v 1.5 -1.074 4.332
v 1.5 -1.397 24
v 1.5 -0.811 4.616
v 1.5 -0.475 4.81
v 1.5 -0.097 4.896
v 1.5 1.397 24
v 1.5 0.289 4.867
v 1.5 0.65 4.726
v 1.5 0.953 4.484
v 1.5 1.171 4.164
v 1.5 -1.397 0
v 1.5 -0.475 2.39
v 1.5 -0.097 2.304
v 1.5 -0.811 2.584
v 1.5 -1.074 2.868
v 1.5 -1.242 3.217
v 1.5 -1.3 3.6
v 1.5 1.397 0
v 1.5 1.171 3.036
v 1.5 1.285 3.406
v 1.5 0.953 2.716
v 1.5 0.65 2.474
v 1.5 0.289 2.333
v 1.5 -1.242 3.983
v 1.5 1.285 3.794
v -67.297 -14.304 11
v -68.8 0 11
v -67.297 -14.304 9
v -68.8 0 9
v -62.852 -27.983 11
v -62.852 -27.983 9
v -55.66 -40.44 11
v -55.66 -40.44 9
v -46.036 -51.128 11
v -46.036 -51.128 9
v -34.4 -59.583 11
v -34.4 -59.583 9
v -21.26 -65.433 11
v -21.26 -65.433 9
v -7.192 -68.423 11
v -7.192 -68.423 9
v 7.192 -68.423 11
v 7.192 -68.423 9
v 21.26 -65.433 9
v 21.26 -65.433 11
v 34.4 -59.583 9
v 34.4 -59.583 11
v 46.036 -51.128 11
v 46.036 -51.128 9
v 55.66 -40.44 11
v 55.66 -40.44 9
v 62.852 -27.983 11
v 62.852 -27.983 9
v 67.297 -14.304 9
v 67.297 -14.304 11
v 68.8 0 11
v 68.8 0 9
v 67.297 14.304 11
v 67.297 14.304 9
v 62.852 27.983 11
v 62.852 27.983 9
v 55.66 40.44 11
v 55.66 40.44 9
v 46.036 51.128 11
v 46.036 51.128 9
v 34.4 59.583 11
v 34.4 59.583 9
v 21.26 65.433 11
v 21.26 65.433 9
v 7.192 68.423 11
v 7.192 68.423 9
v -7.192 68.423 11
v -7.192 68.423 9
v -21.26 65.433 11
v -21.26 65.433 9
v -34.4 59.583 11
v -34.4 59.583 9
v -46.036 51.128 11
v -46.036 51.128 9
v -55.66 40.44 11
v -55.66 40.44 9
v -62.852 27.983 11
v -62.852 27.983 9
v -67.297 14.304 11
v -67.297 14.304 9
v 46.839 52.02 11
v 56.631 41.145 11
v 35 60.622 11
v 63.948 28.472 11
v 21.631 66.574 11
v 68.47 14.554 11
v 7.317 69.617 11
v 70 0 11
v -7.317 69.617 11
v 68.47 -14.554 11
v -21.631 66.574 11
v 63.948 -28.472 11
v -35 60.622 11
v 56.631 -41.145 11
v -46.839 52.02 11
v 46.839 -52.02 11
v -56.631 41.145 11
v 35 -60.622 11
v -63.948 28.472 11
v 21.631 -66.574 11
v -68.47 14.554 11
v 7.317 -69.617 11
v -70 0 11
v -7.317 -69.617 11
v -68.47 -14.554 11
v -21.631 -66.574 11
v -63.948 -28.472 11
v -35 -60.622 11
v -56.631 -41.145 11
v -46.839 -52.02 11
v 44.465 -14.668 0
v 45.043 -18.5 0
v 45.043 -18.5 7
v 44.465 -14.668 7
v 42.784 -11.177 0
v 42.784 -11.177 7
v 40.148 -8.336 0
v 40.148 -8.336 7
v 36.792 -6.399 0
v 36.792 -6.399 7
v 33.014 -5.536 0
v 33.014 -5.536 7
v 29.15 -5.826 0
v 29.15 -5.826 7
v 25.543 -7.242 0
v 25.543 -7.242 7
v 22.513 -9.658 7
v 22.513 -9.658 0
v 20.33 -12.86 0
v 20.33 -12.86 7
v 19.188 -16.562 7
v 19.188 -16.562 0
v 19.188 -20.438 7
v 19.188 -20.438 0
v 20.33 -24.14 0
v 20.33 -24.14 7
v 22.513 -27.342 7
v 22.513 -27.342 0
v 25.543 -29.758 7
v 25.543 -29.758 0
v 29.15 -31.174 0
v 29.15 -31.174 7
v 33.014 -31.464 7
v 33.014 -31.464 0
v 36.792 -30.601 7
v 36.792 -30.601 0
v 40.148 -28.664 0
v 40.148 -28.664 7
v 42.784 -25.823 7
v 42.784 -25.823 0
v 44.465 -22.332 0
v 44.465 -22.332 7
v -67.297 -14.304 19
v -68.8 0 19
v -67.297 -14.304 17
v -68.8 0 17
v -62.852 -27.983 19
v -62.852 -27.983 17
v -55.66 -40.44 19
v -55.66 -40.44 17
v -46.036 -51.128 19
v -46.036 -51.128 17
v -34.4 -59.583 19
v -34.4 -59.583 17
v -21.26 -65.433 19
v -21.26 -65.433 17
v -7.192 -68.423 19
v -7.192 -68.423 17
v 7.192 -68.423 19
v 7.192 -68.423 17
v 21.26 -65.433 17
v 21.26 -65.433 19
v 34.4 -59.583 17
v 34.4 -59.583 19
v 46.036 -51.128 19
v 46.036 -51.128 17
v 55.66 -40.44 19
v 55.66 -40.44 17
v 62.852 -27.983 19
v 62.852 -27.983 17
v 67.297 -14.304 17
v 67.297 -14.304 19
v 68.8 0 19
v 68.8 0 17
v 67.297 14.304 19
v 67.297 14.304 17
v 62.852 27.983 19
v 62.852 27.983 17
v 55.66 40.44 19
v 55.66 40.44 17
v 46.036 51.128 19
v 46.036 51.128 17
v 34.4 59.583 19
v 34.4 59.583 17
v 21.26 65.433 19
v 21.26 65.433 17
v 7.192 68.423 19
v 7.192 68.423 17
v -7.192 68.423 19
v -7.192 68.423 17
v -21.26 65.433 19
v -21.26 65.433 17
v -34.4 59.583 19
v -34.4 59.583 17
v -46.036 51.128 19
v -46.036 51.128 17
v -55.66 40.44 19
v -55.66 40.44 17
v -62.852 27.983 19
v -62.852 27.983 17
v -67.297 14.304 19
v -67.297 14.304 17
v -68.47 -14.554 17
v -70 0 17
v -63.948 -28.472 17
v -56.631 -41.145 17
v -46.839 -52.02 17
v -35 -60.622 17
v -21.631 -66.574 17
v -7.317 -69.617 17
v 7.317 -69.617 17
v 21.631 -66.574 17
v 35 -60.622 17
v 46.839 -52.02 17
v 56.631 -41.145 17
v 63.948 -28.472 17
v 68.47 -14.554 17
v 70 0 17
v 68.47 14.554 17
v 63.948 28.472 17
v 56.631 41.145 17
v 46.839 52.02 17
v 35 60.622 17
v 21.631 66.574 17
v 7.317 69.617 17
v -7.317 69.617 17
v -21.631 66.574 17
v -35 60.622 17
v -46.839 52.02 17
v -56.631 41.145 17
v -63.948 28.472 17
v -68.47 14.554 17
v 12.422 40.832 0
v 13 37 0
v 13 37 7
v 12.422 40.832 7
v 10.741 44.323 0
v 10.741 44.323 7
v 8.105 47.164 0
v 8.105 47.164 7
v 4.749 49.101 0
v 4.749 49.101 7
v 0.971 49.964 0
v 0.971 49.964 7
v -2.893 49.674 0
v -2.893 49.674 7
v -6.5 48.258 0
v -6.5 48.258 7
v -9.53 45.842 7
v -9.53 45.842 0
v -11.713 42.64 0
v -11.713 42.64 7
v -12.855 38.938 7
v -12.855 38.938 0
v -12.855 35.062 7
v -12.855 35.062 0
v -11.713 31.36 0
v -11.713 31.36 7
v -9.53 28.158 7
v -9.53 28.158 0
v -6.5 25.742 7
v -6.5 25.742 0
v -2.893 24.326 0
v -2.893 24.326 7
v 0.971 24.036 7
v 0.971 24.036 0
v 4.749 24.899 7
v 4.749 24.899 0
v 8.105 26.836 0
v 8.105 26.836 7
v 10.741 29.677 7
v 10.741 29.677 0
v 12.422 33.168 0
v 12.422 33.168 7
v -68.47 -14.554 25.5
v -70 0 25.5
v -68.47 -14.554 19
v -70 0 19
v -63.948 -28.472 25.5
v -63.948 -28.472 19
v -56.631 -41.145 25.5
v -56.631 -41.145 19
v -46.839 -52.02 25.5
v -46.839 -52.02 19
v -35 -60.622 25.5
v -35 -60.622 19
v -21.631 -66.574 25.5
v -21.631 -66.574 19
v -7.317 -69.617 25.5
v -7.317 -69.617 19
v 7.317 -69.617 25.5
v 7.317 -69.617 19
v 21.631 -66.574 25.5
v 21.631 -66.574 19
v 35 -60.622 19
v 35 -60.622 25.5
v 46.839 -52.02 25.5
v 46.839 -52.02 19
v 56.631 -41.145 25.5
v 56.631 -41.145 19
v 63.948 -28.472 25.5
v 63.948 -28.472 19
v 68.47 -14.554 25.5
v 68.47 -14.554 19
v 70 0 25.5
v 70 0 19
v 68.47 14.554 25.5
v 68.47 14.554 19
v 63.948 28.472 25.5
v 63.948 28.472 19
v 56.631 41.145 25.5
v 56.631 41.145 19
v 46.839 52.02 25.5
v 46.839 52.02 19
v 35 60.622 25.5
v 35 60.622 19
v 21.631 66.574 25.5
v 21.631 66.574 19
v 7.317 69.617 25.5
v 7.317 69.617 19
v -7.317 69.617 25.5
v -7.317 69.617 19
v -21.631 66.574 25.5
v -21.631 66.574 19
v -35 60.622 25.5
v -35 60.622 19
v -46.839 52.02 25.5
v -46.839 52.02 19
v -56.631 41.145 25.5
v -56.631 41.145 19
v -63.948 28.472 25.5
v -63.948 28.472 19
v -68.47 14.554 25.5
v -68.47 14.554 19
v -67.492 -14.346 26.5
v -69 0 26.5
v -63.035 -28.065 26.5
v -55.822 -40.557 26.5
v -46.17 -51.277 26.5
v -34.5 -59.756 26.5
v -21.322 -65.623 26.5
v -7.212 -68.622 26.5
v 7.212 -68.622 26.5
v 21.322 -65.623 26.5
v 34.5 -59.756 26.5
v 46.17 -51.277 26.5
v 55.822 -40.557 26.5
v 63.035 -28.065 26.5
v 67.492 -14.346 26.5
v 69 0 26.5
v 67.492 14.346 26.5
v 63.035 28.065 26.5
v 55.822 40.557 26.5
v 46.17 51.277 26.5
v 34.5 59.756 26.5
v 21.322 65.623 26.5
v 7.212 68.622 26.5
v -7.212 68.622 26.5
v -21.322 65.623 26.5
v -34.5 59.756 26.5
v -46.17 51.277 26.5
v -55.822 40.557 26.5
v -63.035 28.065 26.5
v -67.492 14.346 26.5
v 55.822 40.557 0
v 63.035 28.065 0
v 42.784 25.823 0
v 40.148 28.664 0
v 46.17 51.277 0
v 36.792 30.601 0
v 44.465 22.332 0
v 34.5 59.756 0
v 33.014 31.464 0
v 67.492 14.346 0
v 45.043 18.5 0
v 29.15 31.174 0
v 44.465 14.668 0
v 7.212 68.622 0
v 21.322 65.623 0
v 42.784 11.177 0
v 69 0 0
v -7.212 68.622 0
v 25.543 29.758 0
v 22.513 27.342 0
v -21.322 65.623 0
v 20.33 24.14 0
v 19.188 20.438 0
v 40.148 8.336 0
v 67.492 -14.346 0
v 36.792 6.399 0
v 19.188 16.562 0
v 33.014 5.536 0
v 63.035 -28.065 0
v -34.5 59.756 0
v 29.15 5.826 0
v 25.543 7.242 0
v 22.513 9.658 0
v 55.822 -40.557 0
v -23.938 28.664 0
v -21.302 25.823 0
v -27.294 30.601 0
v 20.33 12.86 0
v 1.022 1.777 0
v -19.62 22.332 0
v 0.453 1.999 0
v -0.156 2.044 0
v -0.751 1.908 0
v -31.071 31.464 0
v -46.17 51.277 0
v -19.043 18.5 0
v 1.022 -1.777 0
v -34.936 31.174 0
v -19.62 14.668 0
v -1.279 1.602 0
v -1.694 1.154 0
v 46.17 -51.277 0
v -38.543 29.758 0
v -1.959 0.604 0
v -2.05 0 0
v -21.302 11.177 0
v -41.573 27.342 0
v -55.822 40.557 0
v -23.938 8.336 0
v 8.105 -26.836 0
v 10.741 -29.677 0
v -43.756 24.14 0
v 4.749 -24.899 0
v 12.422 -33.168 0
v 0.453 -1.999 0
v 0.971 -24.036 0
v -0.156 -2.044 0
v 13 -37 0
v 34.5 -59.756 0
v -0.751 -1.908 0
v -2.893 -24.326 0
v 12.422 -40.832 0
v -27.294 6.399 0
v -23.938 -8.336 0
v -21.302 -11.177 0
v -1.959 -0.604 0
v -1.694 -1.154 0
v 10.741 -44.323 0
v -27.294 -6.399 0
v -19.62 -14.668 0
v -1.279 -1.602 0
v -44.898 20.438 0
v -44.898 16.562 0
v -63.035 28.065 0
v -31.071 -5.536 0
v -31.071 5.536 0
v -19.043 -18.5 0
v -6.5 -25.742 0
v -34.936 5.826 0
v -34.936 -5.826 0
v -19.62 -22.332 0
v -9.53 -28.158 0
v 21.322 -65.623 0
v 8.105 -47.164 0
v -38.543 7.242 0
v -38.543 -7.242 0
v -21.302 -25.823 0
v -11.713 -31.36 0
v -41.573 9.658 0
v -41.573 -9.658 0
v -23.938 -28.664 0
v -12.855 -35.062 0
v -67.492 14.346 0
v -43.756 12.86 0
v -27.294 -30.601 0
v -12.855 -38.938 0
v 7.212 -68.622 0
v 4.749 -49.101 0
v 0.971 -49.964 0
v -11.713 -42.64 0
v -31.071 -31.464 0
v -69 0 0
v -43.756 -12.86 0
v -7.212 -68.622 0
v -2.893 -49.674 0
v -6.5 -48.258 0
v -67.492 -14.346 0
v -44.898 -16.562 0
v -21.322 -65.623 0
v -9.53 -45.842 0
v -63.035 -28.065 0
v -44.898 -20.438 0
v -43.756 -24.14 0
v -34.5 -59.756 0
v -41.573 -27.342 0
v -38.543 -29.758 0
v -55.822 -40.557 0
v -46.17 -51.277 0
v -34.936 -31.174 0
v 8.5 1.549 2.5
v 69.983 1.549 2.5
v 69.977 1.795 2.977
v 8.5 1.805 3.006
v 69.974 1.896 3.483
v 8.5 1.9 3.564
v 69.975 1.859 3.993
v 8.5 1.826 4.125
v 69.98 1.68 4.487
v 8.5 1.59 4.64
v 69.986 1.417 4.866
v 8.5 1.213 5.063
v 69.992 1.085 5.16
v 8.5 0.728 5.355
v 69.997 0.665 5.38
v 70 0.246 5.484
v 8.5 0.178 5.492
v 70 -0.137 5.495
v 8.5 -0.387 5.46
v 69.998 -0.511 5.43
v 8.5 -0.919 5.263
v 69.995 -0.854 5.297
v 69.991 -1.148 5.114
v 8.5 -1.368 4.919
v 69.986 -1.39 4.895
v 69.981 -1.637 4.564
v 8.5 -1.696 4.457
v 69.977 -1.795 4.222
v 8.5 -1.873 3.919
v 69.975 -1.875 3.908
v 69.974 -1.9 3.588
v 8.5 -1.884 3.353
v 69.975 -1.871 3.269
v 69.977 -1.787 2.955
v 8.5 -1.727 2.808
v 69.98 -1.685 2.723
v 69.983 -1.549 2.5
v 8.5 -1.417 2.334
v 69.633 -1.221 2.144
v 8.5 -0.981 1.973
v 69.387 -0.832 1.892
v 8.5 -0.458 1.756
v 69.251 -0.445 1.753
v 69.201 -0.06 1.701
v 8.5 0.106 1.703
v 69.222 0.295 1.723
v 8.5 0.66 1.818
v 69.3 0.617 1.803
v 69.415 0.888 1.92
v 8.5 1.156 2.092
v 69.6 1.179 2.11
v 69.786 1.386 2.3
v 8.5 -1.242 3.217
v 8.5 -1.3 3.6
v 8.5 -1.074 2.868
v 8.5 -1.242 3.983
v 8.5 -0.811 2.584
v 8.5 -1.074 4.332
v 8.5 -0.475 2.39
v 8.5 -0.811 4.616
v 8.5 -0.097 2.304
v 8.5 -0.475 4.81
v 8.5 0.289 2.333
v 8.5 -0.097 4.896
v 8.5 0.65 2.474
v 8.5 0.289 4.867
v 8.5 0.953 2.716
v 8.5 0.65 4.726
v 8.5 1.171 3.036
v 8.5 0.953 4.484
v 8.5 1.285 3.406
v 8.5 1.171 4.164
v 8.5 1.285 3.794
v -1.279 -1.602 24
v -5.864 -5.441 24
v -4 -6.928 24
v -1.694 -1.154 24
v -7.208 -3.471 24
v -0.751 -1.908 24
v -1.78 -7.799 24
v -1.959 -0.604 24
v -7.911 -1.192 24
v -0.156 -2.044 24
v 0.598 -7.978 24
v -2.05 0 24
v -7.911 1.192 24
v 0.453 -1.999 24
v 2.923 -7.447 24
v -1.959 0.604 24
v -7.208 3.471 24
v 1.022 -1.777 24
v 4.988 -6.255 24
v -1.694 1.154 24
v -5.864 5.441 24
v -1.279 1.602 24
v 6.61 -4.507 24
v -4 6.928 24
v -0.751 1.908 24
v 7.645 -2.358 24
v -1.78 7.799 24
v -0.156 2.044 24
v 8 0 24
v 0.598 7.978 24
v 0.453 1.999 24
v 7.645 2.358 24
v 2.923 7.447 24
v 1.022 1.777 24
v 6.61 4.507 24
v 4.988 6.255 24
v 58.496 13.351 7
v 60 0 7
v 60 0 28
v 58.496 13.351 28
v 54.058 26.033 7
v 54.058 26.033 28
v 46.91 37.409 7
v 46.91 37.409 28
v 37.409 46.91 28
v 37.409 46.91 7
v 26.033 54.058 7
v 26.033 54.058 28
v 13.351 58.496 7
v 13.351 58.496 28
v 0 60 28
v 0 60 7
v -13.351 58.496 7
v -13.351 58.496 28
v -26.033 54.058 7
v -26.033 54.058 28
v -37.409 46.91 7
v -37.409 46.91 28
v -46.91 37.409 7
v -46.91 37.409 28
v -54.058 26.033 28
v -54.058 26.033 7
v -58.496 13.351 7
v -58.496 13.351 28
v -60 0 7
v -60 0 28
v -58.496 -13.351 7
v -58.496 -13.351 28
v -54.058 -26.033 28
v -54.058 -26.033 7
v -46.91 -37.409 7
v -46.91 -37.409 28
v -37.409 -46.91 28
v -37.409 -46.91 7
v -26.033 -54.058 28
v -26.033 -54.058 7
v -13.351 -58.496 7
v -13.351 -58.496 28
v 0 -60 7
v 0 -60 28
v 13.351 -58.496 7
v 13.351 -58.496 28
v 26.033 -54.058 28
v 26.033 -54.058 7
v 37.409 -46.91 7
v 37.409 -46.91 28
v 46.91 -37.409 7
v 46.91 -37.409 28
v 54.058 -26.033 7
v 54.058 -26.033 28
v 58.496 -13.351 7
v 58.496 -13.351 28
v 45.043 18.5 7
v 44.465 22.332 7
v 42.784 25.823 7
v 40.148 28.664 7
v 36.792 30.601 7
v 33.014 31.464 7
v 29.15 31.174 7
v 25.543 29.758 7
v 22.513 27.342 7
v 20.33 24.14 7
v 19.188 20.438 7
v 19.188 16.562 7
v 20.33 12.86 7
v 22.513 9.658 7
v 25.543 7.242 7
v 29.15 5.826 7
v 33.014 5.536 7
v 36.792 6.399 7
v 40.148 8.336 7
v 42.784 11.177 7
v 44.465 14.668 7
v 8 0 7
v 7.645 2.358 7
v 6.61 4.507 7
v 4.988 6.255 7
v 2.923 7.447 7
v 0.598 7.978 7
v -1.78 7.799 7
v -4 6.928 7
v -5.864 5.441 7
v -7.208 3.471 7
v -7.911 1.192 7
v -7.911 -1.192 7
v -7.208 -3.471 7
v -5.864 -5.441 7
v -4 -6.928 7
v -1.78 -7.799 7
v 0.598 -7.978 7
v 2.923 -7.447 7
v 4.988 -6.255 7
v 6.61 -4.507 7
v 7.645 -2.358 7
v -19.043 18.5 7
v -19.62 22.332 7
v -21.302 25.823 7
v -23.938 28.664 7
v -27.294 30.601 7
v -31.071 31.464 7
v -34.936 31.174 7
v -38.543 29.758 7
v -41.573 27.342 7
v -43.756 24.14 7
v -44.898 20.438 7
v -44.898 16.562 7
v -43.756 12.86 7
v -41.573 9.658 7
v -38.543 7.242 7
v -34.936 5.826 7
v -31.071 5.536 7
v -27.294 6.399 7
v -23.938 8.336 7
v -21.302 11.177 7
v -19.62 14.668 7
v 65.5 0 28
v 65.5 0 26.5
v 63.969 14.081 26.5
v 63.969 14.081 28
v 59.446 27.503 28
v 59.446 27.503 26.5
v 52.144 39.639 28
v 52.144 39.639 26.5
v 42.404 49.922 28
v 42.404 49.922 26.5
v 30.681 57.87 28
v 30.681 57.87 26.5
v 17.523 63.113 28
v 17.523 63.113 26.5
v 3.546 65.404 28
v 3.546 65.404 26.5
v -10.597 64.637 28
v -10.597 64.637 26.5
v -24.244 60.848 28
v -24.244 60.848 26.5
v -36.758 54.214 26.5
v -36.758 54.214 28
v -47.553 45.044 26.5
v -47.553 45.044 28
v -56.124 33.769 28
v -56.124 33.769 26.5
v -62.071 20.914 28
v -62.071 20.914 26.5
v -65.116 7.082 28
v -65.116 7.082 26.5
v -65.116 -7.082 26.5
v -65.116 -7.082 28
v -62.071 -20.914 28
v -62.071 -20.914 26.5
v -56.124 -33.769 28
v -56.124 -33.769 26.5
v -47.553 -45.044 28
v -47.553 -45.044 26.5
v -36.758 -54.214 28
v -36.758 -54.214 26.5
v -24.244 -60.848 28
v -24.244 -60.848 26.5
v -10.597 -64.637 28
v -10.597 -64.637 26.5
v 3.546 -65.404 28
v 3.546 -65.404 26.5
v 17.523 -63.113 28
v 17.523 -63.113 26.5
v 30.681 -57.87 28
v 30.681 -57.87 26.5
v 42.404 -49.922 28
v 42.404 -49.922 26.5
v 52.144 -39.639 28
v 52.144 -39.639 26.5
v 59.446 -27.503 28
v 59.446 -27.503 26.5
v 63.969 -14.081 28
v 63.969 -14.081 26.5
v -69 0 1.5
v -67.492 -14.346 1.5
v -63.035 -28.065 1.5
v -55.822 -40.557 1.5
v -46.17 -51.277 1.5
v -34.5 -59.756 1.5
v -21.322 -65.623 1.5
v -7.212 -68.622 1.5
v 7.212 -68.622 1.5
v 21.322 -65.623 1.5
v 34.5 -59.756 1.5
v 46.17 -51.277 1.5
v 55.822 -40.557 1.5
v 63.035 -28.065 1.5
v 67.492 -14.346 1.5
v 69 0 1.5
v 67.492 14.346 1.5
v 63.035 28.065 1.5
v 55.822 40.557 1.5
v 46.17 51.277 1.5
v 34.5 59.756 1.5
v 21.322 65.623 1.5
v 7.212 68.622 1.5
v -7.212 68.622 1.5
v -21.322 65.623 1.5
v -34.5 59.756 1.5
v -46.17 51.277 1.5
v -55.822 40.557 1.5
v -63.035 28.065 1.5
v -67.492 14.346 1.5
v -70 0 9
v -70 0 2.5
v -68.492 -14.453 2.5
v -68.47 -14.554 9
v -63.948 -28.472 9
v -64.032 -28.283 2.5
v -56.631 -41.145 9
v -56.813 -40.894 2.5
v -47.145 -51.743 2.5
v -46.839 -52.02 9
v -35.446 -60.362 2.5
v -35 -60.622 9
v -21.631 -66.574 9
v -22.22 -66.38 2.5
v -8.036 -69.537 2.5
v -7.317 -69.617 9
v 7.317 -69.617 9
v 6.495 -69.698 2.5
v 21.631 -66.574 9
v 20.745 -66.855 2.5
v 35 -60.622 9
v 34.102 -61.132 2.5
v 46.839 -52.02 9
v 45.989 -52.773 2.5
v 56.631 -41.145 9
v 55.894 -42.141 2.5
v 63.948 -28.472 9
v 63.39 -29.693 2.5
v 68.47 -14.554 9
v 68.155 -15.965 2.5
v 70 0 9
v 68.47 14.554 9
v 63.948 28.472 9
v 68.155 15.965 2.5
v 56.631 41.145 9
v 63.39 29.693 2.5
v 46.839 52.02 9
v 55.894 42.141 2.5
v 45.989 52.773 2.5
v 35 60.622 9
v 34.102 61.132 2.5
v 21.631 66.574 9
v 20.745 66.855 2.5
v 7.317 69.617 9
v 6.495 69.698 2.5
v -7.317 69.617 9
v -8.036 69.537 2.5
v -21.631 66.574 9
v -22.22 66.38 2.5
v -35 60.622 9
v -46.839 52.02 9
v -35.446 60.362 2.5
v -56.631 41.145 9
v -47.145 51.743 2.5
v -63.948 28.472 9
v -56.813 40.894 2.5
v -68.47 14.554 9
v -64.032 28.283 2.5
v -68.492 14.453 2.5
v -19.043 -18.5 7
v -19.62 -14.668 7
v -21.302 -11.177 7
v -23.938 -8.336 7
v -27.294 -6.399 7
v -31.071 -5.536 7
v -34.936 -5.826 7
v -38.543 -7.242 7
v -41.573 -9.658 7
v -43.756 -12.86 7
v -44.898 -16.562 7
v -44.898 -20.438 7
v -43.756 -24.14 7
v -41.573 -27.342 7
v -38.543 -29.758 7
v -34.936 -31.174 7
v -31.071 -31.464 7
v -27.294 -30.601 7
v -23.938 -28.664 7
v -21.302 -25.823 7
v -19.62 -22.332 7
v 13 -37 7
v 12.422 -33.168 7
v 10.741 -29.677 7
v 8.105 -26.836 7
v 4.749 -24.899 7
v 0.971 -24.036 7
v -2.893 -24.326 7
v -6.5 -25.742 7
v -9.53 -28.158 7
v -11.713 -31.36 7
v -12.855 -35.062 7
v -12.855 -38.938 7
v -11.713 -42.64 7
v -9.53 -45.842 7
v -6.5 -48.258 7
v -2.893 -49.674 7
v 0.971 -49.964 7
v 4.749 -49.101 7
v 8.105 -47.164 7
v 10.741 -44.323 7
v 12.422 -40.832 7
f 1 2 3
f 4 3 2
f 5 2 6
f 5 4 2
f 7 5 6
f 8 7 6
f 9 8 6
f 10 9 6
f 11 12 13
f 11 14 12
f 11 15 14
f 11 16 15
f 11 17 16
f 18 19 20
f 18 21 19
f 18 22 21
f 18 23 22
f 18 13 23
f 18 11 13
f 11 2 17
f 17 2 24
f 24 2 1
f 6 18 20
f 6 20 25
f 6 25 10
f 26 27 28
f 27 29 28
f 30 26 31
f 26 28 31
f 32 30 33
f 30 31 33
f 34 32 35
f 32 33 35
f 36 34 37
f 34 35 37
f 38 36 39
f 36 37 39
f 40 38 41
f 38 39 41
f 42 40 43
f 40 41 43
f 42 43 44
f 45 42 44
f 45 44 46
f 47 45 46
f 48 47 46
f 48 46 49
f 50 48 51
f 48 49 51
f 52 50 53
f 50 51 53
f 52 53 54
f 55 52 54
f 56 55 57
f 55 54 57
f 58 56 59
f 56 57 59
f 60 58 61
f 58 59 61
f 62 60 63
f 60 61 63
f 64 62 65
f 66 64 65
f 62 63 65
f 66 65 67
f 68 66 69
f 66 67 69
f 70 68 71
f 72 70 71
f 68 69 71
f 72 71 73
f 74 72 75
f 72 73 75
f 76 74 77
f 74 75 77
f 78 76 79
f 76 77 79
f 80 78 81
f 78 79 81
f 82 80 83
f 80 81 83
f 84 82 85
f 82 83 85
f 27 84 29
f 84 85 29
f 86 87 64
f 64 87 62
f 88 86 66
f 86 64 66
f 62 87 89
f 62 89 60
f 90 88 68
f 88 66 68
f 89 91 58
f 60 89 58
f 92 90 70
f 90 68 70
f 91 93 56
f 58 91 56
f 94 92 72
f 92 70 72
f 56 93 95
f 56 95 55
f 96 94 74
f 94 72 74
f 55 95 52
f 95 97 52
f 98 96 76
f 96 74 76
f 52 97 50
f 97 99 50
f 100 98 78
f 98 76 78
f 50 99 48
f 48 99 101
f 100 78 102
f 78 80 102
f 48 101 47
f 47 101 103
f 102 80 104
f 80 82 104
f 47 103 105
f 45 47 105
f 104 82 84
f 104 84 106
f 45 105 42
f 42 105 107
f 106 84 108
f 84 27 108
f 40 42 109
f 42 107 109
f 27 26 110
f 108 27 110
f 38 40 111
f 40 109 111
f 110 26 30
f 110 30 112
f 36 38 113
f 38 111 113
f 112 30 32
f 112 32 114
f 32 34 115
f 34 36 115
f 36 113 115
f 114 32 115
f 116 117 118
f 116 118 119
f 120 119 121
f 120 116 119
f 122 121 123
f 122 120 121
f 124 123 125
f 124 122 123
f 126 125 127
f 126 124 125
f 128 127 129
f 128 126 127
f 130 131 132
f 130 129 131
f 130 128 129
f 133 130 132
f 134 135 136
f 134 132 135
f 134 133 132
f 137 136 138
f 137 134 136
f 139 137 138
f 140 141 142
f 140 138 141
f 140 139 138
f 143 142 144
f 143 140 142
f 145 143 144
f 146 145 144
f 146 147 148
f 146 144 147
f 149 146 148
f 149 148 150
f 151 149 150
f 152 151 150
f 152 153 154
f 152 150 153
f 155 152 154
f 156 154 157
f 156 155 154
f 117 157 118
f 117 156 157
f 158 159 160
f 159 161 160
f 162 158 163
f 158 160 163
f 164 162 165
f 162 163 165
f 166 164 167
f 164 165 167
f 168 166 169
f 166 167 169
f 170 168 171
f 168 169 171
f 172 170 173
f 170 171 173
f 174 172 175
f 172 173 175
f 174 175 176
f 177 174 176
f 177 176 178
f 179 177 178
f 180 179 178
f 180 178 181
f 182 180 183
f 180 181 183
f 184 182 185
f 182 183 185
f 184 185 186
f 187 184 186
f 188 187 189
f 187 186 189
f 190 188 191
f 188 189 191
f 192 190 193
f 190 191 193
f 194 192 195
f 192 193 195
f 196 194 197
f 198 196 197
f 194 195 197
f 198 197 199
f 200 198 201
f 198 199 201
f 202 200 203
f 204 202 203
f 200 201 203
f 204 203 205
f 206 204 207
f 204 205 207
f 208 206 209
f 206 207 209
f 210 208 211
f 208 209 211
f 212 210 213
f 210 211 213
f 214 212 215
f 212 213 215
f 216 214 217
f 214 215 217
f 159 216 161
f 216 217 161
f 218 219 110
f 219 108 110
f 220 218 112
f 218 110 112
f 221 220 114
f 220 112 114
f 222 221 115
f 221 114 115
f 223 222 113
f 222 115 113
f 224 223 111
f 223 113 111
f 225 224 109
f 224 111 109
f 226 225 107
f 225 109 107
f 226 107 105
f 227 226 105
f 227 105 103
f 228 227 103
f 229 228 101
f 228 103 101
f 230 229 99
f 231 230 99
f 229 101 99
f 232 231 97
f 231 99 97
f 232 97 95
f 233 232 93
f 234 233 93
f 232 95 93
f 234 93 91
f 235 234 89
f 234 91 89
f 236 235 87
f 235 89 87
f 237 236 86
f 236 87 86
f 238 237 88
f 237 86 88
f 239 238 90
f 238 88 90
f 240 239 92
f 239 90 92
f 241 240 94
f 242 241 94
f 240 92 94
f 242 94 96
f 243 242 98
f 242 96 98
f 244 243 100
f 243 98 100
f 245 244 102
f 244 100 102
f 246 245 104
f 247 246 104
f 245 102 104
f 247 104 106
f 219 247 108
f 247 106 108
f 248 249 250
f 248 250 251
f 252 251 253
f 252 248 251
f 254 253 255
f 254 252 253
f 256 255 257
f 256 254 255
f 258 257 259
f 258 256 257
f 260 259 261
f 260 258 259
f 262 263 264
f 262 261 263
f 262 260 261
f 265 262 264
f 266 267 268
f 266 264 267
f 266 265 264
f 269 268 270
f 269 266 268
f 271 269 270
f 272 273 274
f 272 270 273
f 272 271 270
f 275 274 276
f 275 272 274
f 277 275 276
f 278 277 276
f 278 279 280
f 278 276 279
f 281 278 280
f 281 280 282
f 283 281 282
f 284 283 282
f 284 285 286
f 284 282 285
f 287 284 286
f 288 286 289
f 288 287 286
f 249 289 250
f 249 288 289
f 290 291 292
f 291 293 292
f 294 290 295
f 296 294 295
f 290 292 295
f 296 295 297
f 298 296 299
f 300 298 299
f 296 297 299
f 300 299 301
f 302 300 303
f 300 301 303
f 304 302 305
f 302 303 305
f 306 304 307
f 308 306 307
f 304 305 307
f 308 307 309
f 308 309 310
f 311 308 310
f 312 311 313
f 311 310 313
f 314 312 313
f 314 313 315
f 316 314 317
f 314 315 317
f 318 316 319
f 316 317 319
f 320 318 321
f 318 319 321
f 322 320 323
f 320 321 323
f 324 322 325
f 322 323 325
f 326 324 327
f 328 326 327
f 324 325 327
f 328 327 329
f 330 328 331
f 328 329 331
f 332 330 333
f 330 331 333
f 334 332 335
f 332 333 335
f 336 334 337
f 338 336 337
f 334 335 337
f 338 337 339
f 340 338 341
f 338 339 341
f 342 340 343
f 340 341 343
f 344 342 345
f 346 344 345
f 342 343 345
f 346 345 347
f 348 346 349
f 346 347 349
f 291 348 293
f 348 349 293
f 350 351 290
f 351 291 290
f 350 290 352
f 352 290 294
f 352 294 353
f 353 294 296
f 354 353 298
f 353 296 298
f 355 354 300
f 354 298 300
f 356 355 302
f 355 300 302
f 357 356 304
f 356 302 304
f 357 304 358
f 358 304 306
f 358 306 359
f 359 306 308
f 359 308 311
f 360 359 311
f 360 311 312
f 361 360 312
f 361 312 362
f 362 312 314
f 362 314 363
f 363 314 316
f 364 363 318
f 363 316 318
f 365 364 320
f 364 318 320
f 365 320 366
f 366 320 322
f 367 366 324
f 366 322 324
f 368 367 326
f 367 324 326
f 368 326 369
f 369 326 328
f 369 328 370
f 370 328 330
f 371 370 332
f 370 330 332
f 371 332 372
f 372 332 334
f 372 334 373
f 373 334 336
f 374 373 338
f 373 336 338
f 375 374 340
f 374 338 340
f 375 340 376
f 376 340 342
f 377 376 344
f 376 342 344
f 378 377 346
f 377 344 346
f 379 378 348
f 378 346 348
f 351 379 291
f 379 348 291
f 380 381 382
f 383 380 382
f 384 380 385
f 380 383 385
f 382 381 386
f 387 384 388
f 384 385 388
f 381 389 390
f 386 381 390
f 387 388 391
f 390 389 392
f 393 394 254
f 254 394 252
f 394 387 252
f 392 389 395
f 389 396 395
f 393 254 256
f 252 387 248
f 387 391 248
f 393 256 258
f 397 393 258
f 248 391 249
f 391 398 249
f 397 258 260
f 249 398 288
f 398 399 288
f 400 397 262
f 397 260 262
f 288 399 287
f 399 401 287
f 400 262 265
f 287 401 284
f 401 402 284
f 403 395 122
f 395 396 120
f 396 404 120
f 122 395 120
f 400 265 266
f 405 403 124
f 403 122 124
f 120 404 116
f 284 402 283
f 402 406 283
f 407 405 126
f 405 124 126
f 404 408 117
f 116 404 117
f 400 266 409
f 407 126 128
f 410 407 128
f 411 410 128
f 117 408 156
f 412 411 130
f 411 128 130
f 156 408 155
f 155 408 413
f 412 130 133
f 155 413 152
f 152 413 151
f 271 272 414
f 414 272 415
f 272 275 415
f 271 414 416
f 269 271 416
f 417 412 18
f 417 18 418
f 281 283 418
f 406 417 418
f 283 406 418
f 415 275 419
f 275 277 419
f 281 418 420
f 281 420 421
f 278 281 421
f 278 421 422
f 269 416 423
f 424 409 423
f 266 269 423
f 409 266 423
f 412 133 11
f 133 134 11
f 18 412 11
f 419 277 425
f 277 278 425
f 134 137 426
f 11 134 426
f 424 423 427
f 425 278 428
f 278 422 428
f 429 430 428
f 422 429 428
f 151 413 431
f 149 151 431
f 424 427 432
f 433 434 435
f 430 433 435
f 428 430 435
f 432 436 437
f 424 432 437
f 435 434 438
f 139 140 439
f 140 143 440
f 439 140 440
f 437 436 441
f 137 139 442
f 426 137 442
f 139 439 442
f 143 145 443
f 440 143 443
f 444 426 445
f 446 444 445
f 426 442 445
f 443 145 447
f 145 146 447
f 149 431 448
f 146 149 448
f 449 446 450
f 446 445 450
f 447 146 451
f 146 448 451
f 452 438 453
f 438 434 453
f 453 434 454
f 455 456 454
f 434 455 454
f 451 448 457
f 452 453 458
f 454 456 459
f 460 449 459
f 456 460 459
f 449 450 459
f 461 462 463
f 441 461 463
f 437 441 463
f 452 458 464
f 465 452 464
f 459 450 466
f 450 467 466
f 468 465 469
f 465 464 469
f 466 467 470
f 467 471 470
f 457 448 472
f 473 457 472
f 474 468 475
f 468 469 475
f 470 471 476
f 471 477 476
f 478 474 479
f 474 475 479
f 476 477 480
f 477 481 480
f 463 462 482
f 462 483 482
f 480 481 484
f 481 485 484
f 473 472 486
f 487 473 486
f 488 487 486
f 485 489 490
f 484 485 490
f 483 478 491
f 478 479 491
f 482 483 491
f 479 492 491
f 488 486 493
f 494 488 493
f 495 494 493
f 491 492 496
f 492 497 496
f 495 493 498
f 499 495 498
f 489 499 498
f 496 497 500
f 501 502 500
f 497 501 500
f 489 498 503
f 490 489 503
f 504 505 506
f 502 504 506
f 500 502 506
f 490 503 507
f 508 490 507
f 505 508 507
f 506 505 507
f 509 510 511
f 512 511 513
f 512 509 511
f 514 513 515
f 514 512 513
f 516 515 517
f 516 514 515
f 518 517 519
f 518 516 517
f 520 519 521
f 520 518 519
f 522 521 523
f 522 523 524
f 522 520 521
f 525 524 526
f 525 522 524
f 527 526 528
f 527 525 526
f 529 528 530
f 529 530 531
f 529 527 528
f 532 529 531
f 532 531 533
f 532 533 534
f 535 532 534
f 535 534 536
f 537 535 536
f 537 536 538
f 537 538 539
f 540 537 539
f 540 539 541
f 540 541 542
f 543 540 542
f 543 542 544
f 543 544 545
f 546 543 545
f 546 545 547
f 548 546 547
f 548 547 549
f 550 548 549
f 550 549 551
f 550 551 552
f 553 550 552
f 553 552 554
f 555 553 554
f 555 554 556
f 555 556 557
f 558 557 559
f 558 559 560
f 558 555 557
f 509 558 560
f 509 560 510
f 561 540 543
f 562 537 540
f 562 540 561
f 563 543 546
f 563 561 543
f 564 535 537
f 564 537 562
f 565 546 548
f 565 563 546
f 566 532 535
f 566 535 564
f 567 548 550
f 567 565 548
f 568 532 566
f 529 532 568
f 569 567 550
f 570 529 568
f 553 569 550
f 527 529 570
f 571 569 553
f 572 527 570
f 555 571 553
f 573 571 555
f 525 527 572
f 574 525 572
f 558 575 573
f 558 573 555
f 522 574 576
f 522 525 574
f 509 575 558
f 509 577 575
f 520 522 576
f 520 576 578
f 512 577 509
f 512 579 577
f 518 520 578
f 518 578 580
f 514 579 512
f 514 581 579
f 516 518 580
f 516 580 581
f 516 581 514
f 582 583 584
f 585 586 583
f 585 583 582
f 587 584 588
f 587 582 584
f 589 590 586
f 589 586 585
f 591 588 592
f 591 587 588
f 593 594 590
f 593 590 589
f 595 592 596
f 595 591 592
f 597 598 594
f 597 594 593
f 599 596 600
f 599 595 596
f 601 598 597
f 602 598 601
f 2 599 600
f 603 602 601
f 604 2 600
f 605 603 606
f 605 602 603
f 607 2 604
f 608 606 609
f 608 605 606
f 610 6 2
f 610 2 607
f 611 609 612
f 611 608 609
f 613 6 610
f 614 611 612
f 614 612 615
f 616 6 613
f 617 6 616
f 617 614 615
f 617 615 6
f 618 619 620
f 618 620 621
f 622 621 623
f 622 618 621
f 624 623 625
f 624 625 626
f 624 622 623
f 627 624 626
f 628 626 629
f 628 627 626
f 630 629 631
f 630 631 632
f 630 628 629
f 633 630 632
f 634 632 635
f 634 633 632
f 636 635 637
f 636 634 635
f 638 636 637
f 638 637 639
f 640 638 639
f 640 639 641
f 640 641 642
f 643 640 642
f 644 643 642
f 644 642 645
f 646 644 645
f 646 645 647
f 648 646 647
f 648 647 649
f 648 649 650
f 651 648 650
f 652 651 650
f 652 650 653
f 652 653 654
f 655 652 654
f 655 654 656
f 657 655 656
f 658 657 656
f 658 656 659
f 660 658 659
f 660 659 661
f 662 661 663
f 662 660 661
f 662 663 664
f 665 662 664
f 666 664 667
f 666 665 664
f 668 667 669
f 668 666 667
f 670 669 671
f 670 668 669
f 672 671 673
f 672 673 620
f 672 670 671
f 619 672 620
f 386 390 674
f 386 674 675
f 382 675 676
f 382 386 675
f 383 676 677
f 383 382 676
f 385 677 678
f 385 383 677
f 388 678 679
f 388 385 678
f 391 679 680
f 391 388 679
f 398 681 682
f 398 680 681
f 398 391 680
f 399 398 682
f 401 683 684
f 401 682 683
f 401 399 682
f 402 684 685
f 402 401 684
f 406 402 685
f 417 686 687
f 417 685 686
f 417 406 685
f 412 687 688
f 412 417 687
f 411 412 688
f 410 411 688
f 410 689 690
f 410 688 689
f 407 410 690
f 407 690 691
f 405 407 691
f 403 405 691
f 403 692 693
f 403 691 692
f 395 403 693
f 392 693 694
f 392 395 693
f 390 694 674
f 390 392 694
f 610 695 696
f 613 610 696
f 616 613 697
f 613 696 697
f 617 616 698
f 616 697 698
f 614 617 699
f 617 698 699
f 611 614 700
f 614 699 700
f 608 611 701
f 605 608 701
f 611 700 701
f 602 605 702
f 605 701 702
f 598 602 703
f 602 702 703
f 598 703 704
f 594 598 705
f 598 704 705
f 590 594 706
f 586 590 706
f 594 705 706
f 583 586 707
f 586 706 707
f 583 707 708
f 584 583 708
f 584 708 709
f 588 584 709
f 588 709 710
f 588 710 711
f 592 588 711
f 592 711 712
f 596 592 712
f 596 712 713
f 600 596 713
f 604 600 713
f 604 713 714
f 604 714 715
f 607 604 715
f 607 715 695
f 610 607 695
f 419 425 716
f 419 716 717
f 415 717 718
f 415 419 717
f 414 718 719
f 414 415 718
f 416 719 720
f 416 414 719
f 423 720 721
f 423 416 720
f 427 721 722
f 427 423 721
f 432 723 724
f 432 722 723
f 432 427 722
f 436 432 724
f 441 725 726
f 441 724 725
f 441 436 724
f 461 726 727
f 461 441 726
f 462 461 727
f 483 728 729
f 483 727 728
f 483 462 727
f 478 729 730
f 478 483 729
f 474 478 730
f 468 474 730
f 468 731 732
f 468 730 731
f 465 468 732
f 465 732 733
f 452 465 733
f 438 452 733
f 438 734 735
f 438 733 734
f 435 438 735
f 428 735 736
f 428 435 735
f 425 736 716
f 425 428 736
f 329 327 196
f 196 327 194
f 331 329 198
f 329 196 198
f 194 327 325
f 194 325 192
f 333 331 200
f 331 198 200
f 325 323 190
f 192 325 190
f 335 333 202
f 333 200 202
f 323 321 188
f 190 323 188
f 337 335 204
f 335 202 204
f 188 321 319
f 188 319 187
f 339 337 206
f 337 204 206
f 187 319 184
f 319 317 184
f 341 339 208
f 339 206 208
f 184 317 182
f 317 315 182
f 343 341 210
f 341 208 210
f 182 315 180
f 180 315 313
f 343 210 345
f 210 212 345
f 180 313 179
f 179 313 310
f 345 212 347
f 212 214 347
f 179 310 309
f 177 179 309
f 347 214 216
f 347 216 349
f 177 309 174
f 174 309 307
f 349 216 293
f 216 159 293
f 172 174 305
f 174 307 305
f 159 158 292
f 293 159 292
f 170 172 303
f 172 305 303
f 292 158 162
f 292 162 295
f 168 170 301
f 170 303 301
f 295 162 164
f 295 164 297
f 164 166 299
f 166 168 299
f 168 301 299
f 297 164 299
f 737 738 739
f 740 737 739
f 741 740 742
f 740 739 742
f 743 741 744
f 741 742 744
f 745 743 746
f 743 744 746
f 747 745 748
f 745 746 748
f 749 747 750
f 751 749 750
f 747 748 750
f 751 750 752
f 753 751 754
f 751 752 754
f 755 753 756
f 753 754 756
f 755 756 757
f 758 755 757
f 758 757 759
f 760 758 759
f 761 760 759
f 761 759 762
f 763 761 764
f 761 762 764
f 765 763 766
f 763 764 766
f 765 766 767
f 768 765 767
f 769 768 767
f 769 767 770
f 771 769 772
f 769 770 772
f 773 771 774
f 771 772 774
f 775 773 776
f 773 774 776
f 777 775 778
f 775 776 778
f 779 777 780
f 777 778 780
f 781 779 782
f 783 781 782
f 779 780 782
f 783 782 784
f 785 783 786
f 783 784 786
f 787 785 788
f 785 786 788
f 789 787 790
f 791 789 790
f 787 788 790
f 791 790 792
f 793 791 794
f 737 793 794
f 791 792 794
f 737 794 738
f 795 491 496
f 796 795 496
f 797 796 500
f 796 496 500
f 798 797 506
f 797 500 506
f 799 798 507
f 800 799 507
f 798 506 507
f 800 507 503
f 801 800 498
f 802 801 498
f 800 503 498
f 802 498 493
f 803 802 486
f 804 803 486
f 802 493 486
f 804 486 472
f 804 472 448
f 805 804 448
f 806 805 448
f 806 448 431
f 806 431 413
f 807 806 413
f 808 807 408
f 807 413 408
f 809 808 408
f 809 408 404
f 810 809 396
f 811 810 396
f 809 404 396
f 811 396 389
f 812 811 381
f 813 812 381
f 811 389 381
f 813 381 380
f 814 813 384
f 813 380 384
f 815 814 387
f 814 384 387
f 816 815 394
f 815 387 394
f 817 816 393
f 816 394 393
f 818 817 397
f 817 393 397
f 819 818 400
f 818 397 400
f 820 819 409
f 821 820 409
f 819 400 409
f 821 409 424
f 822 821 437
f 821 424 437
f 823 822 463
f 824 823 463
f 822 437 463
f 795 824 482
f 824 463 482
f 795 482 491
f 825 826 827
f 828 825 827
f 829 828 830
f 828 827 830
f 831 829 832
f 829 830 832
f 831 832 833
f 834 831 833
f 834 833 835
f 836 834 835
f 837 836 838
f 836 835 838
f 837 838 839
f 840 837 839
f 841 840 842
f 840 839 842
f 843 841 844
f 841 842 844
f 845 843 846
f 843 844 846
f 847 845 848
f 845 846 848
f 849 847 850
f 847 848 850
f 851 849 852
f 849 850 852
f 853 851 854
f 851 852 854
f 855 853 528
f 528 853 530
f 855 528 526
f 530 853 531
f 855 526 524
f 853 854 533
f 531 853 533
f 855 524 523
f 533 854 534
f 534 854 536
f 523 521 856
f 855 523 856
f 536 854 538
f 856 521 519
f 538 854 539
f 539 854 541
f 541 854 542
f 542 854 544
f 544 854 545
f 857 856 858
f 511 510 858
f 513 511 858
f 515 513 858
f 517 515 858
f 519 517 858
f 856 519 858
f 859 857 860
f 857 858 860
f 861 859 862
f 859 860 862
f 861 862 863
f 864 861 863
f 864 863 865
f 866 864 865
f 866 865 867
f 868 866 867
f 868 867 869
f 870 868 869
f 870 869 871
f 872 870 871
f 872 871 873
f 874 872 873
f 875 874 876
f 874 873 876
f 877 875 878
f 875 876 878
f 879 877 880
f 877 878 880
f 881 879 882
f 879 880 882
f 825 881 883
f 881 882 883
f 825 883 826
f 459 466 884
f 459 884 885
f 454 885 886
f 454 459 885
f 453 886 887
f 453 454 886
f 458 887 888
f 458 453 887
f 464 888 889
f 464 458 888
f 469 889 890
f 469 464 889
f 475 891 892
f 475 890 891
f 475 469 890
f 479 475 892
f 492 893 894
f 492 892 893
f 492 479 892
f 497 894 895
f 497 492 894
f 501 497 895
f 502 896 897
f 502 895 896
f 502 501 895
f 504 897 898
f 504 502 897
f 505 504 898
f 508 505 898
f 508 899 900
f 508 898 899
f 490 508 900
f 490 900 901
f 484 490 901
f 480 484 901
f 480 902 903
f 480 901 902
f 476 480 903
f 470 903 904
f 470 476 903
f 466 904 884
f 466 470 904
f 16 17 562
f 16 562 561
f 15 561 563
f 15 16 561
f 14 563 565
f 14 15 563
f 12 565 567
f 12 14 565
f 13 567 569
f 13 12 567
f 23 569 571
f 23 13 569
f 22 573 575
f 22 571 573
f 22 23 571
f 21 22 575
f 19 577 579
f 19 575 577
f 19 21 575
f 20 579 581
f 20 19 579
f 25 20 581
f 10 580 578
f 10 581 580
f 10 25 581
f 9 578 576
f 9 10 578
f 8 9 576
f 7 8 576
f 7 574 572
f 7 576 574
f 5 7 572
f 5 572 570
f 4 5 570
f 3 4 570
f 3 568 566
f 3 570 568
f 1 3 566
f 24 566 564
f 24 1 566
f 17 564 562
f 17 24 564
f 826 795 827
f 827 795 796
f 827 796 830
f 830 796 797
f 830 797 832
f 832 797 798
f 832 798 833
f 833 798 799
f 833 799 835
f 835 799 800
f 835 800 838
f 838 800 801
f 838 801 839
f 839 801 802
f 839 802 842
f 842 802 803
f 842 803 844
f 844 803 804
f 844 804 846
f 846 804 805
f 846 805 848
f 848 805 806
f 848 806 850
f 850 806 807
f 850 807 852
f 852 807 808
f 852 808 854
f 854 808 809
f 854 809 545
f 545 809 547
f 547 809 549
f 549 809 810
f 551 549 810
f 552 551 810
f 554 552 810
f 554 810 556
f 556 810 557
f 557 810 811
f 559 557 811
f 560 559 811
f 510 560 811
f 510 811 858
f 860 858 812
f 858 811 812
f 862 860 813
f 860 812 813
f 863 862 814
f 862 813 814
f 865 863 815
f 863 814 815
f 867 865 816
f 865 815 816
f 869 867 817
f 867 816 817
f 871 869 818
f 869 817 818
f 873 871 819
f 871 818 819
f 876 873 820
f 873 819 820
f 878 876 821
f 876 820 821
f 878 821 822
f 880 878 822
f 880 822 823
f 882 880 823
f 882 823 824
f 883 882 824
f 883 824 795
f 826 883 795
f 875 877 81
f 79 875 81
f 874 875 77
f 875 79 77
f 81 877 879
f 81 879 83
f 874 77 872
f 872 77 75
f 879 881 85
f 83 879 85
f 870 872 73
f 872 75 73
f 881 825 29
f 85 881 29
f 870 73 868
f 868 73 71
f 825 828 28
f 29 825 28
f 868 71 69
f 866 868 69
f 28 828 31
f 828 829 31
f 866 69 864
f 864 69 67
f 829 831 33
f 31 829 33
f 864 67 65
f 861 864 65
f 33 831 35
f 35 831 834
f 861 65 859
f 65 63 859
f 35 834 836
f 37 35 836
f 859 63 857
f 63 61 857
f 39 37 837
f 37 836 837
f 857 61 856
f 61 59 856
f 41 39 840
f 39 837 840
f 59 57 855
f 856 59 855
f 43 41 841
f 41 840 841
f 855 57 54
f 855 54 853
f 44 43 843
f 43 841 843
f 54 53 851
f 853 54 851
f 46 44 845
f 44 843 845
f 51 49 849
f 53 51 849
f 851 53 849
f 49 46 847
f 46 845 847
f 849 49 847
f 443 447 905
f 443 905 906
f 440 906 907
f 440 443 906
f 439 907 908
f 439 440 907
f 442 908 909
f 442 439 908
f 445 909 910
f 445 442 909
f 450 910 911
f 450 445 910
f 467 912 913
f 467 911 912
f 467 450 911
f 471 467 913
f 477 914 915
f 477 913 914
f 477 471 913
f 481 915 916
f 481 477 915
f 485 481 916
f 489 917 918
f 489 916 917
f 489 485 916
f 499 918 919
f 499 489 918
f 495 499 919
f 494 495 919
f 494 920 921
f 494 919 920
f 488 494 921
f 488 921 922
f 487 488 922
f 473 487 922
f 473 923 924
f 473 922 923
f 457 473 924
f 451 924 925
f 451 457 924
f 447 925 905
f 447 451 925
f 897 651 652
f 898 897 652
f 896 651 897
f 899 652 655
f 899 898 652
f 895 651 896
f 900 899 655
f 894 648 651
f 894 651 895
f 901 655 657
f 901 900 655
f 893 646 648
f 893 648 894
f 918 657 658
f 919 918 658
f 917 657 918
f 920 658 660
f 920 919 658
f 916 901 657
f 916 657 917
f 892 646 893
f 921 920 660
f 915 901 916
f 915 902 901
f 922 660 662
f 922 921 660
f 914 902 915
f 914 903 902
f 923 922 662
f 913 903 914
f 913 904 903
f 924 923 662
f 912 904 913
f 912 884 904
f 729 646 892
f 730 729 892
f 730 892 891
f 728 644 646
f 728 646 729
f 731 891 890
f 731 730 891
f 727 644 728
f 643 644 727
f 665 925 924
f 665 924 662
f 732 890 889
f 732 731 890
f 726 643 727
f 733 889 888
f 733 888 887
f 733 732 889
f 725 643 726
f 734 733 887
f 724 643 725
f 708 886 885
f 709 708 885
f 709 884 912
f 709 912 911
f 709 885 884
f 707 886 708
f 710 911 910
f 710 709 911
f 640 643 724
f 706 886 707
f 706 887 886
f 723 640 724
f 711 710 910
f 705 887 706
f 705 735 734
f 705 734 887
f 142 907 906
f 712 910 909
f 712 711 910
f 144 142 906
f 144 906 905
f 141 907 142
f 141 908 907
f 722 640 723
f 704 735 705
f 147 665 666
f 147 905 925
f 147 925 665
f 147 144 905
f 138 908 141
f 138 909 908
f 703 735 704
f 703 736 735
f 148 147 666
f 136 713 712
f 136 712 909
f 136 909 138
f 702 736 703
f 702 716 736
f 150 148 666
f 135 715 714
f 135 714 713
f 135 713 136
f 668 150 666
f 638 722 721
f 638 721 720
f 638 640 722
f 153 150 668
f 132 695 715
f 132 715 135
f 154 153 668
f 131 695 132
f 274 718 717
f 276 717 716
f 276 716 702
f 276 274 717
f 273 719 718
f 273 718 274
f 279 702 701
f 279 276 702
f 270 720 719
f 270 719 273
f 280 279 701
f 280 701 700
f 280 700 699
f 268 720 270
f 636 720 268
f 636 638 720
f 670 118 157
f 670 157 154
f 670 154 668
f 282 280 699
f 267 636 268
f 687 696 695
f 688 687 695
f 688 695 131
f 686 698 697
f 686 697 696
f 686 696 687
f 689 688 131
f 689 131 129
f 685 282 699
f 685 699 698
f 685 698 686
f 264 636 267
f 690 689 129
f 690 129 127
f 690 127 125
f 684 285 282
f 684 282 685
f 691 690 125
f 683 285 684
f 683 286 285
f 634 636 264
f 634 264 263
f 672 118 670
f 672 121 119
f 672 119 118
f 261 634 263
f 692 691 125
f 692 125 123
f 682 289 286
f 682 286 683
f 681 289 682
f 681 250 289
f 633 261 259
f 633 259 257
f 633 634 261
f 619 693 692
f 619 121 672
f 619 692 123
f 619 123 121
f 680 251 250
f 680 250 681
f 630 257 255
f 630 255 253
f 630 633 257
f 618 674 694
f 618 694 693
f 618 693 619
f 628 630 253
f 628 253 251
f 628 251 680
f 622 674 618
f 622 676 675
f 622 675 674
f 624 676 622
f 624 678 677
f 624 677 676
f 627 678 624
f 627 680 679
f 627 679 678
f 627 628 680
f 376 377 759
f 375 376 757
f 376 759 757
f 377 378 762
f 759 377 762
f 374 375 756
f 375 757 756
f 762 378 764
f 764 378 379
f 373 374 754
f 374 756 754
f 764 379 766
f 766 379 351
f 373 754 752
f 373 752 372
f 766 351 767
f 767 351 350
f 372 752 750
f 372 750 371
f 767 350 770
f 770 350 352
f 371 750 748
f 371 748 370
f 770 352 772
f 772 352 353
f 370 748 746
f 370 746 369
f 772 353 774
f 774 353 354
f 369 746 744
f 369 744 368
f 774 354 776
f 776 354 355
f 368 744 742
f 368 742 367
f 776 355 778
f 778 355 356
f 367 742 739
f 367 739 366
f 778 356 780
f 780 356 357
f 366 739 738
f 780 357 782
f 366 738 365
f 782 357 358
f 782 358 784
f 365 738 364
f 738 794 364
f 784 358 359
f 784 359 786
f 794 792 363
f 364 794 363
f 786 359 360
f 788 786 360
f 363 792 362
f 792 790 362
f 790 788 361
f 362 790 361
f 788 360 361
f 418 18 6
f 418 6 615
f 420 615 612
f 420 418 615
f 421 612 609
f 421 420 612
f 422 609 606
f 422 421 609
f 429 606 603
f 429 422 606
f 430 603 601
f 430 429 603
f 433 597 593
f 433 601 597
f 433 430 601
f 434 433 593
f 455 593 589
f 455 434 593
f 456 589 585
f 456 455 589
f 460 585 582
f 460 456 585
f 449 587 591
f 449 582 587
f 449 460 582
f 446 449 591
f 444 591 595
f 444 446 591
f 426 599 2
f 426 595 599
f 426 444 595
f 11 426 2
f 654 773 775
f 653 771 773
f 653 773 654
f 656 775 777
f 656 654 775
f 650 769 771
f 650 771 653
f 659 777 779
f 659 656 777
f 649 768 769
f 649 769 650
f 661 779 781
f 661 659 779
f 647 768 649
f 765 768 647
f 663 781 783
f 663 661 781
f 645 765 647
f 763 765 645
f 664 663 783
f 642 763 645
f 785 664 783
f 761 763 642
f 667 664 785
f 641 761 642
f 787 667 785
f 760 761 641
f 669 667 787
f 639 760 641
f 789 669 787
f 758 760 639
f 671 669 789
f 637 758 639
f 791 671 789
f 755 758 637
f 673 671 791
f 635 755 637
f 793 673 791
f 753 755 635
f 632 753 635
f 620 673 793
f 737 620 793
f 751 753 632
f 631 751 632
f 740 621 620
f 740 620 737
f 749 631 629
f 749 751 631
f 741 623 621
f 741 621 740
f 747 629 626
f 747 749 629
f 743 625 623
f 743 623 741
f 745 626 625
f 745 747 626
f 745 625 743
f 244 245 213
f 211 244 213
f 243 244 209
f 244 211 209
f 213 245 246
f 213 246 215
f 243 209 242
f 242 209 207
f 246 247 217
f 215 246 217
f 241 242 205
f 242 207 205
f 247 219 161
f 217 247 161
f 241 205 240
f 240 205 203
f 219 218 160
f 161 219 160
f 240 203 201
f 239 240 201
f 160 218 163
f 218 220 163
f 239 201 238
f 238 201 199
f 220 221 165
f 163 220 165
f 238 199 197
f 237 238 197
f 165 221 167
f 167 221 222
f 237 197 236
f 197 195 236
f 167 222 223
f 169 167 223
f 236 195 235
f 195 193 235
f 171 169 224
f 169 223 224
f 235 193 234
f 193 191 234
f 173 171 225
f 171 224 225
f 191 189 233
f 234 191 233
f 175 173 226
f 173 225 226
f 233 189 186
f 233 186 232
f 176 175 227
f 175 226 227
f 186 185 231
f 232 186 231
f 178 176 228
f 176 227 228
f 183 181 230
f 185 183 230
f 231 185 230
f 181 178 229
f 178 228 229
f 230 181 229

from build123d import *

# Parameters (mm, degrees)
SKETCH1_R              = 64
SKETCH1_R_2            = 60
RIM_DEPTH              = 28
SKETCH2_R              = 65.5
SKETCH2_R_2            = 63
INNER_BEAD_LIP_DEPTH   = 1.5
SKETCH3_R              = 65.5
SKETCH3_R_2            = 63
OUTER_BEAD_LIP_DEPTH   = 1.5
SKETCH4_R              = 61
WEB_DEPTH              = 7
SKETCH5_R              = 8
HUB_BOSS_DEPTH         = 24
SKETCH6_R              = 13
LIGHTENING_HOLES_DEPTH = 9
D_BORE_4MM_DEPTH       = 30
SKETCH9_R              = 69
SKETCH9_R_2            = 64
BED_RING_DEPTH         = 1.5
SKETCH10_R             = 1.3
GRUB_SCREW_M3_DEPTH    = 9
SKETCH11_R             = 1.9
GRUB_KEY_ACCESS_DEPTH  = 62.5


with BuildPart() as part:
    # Sketch1 → Rim (new body)
    with BuildSketch(Plane.XY):
        Circle(SKETCH1_R)
        Circle(SKETCH1_R_2, mode=Mode.SUBTRACT)
    extrude(amount=RIM_DEPTH)

    # Sketch2 → Inner_bead_lip (add)
    with BuildSketch(Plane.XY):
        Circle(SKETCH2_R)
        Circle(SKETCH2_R_2, mode=Mode.SUBTRACT)
    extrude(amount=INNER_BEAD_LIP_DEPTH)

    # Sketch3 → Outer_bead_lip (add)
    with BuildSketch(Plane.XY.offset(26.5)):
        Circle(SKETCH3_R)
        Circle(SKETCH3_R_2, mode=Mode.SUBTRACT)
    extrude(amount=OUTER_BEAD_LIP_DEPTH)

    # Sketch4 → Web (add)
    with BuildSketch(Plane.XY):
        Circle(SKETCH4_R)
    extrude(amount=WEB_DEPTH)

    # Sketch5 → Hub_boss (add)
    with BuildSketch(Plane.XY):
        Circle(SKETCH5_R)
    extrude(amount=HUB_BOSS_DEPTH)

    # Sketch6 → Lightening_holes (cut)
    with BuildSketch(Plane.XY.offset(-1)):
        with Locations((32.04293994, 18.5)):
            Circle(SKETCH6_R)
        with Locations((0, 37)):
            Circle(SKETCH6_R)
        with Locations((-32.04293994, 18.5)):
            Circle(SKETCH6_R)
        with Locations((-32.04293994, -18.5)):
            Circle(SKETCH6_R)
        with Locations((0, -37)):
            Circle(SKETCH6_R)
        with Locations((32.04293994, -18.5)):
            Circle(SKETCH6_R)
    extrude(amount=LIGHTENING_HOLES_DEPTH, mode=Mode.SUBTRACT)

    # Sketch7 → D_bore_4mm (cut)
    with BuildSketch(Plane.XY.offset(-1)):
        with BuildLine():
            Line((1.5, -1.397318861), (1.5, 1.397318861))
            ThreePointArc((1.5, 1.397318861), (-2.05, 0), (1.5, -1.397318861))
        make_face()
    extrude(amount=D_BORE_4MM_DEPTH, mode=Mode.SUBTRACT)

    # Sketch8 → Tyre (revolve)
    with BuildSketch(Plane(origin=(0, 0, 0), x_dir=(0, 0, -1), z_dir=(1, 0, 0)), mode=Mode.PRIVATE) as tyre_sk:
        Polygon((-1.5, 64), (-26.5, 64), (-26.5, 69), (-25.5, 70), (-19, 70), (-19, 68.8), (-17, 68.8), (-17, 70), (-11, 70), (-11, 68.8), (-9, 68.8), (-9, 70), (-2.5, 70), (-1.5, 69), align=None)
    revolve(tyre_sk.sketch.rotate(Axis((0, 0, 0), (0, 0, 1)), 90), axis=Axis((0, 0, 0), (0, 0, 1)))

    # Sketch9 → Bed_ring (add)
    with BuildSketch(Plane.XY):
        with Locations(Location((0, 0, 0), (0, 0, 180))):
            Circle(SKETCH9_R)
        Circle(SKETCH9_R_2, mode=Mode.SUBTRACT)
    extrude(amount=BED_RING_DEPTH)

    # Sketch10 → Grub_screw_M3 (cut)
    with BuildSketch(Plane(origin=(0, 0, 0), x_dir=(0, 0, -1), z_dir=(1, 0, 0))):
        with Locations(Location((-3.6, 0, 0), (0, 0, 270))):
            Circle(SKETCH10_R)
    extrude(amount=GRUB_SCREW_M3_DEPTH, mode=Mode.SUBTRACT)

    # Sketch11 → Grub_key_access (cut)
    with BuildSketch(Plane(origin=(8.5, 0, 0), x_dir=(0, 0, -1), z_dir=(1, 0, 0))):
        with Locations(Location((-3.6, 0, 0), (0, 0, 54.623459848))):
            Circle(SKETCH11_R)
    extrude(amount=GRUB_KEY_ACCESS_DEPTH, mode=Mode.SUBTRACT)


solid = part.part
